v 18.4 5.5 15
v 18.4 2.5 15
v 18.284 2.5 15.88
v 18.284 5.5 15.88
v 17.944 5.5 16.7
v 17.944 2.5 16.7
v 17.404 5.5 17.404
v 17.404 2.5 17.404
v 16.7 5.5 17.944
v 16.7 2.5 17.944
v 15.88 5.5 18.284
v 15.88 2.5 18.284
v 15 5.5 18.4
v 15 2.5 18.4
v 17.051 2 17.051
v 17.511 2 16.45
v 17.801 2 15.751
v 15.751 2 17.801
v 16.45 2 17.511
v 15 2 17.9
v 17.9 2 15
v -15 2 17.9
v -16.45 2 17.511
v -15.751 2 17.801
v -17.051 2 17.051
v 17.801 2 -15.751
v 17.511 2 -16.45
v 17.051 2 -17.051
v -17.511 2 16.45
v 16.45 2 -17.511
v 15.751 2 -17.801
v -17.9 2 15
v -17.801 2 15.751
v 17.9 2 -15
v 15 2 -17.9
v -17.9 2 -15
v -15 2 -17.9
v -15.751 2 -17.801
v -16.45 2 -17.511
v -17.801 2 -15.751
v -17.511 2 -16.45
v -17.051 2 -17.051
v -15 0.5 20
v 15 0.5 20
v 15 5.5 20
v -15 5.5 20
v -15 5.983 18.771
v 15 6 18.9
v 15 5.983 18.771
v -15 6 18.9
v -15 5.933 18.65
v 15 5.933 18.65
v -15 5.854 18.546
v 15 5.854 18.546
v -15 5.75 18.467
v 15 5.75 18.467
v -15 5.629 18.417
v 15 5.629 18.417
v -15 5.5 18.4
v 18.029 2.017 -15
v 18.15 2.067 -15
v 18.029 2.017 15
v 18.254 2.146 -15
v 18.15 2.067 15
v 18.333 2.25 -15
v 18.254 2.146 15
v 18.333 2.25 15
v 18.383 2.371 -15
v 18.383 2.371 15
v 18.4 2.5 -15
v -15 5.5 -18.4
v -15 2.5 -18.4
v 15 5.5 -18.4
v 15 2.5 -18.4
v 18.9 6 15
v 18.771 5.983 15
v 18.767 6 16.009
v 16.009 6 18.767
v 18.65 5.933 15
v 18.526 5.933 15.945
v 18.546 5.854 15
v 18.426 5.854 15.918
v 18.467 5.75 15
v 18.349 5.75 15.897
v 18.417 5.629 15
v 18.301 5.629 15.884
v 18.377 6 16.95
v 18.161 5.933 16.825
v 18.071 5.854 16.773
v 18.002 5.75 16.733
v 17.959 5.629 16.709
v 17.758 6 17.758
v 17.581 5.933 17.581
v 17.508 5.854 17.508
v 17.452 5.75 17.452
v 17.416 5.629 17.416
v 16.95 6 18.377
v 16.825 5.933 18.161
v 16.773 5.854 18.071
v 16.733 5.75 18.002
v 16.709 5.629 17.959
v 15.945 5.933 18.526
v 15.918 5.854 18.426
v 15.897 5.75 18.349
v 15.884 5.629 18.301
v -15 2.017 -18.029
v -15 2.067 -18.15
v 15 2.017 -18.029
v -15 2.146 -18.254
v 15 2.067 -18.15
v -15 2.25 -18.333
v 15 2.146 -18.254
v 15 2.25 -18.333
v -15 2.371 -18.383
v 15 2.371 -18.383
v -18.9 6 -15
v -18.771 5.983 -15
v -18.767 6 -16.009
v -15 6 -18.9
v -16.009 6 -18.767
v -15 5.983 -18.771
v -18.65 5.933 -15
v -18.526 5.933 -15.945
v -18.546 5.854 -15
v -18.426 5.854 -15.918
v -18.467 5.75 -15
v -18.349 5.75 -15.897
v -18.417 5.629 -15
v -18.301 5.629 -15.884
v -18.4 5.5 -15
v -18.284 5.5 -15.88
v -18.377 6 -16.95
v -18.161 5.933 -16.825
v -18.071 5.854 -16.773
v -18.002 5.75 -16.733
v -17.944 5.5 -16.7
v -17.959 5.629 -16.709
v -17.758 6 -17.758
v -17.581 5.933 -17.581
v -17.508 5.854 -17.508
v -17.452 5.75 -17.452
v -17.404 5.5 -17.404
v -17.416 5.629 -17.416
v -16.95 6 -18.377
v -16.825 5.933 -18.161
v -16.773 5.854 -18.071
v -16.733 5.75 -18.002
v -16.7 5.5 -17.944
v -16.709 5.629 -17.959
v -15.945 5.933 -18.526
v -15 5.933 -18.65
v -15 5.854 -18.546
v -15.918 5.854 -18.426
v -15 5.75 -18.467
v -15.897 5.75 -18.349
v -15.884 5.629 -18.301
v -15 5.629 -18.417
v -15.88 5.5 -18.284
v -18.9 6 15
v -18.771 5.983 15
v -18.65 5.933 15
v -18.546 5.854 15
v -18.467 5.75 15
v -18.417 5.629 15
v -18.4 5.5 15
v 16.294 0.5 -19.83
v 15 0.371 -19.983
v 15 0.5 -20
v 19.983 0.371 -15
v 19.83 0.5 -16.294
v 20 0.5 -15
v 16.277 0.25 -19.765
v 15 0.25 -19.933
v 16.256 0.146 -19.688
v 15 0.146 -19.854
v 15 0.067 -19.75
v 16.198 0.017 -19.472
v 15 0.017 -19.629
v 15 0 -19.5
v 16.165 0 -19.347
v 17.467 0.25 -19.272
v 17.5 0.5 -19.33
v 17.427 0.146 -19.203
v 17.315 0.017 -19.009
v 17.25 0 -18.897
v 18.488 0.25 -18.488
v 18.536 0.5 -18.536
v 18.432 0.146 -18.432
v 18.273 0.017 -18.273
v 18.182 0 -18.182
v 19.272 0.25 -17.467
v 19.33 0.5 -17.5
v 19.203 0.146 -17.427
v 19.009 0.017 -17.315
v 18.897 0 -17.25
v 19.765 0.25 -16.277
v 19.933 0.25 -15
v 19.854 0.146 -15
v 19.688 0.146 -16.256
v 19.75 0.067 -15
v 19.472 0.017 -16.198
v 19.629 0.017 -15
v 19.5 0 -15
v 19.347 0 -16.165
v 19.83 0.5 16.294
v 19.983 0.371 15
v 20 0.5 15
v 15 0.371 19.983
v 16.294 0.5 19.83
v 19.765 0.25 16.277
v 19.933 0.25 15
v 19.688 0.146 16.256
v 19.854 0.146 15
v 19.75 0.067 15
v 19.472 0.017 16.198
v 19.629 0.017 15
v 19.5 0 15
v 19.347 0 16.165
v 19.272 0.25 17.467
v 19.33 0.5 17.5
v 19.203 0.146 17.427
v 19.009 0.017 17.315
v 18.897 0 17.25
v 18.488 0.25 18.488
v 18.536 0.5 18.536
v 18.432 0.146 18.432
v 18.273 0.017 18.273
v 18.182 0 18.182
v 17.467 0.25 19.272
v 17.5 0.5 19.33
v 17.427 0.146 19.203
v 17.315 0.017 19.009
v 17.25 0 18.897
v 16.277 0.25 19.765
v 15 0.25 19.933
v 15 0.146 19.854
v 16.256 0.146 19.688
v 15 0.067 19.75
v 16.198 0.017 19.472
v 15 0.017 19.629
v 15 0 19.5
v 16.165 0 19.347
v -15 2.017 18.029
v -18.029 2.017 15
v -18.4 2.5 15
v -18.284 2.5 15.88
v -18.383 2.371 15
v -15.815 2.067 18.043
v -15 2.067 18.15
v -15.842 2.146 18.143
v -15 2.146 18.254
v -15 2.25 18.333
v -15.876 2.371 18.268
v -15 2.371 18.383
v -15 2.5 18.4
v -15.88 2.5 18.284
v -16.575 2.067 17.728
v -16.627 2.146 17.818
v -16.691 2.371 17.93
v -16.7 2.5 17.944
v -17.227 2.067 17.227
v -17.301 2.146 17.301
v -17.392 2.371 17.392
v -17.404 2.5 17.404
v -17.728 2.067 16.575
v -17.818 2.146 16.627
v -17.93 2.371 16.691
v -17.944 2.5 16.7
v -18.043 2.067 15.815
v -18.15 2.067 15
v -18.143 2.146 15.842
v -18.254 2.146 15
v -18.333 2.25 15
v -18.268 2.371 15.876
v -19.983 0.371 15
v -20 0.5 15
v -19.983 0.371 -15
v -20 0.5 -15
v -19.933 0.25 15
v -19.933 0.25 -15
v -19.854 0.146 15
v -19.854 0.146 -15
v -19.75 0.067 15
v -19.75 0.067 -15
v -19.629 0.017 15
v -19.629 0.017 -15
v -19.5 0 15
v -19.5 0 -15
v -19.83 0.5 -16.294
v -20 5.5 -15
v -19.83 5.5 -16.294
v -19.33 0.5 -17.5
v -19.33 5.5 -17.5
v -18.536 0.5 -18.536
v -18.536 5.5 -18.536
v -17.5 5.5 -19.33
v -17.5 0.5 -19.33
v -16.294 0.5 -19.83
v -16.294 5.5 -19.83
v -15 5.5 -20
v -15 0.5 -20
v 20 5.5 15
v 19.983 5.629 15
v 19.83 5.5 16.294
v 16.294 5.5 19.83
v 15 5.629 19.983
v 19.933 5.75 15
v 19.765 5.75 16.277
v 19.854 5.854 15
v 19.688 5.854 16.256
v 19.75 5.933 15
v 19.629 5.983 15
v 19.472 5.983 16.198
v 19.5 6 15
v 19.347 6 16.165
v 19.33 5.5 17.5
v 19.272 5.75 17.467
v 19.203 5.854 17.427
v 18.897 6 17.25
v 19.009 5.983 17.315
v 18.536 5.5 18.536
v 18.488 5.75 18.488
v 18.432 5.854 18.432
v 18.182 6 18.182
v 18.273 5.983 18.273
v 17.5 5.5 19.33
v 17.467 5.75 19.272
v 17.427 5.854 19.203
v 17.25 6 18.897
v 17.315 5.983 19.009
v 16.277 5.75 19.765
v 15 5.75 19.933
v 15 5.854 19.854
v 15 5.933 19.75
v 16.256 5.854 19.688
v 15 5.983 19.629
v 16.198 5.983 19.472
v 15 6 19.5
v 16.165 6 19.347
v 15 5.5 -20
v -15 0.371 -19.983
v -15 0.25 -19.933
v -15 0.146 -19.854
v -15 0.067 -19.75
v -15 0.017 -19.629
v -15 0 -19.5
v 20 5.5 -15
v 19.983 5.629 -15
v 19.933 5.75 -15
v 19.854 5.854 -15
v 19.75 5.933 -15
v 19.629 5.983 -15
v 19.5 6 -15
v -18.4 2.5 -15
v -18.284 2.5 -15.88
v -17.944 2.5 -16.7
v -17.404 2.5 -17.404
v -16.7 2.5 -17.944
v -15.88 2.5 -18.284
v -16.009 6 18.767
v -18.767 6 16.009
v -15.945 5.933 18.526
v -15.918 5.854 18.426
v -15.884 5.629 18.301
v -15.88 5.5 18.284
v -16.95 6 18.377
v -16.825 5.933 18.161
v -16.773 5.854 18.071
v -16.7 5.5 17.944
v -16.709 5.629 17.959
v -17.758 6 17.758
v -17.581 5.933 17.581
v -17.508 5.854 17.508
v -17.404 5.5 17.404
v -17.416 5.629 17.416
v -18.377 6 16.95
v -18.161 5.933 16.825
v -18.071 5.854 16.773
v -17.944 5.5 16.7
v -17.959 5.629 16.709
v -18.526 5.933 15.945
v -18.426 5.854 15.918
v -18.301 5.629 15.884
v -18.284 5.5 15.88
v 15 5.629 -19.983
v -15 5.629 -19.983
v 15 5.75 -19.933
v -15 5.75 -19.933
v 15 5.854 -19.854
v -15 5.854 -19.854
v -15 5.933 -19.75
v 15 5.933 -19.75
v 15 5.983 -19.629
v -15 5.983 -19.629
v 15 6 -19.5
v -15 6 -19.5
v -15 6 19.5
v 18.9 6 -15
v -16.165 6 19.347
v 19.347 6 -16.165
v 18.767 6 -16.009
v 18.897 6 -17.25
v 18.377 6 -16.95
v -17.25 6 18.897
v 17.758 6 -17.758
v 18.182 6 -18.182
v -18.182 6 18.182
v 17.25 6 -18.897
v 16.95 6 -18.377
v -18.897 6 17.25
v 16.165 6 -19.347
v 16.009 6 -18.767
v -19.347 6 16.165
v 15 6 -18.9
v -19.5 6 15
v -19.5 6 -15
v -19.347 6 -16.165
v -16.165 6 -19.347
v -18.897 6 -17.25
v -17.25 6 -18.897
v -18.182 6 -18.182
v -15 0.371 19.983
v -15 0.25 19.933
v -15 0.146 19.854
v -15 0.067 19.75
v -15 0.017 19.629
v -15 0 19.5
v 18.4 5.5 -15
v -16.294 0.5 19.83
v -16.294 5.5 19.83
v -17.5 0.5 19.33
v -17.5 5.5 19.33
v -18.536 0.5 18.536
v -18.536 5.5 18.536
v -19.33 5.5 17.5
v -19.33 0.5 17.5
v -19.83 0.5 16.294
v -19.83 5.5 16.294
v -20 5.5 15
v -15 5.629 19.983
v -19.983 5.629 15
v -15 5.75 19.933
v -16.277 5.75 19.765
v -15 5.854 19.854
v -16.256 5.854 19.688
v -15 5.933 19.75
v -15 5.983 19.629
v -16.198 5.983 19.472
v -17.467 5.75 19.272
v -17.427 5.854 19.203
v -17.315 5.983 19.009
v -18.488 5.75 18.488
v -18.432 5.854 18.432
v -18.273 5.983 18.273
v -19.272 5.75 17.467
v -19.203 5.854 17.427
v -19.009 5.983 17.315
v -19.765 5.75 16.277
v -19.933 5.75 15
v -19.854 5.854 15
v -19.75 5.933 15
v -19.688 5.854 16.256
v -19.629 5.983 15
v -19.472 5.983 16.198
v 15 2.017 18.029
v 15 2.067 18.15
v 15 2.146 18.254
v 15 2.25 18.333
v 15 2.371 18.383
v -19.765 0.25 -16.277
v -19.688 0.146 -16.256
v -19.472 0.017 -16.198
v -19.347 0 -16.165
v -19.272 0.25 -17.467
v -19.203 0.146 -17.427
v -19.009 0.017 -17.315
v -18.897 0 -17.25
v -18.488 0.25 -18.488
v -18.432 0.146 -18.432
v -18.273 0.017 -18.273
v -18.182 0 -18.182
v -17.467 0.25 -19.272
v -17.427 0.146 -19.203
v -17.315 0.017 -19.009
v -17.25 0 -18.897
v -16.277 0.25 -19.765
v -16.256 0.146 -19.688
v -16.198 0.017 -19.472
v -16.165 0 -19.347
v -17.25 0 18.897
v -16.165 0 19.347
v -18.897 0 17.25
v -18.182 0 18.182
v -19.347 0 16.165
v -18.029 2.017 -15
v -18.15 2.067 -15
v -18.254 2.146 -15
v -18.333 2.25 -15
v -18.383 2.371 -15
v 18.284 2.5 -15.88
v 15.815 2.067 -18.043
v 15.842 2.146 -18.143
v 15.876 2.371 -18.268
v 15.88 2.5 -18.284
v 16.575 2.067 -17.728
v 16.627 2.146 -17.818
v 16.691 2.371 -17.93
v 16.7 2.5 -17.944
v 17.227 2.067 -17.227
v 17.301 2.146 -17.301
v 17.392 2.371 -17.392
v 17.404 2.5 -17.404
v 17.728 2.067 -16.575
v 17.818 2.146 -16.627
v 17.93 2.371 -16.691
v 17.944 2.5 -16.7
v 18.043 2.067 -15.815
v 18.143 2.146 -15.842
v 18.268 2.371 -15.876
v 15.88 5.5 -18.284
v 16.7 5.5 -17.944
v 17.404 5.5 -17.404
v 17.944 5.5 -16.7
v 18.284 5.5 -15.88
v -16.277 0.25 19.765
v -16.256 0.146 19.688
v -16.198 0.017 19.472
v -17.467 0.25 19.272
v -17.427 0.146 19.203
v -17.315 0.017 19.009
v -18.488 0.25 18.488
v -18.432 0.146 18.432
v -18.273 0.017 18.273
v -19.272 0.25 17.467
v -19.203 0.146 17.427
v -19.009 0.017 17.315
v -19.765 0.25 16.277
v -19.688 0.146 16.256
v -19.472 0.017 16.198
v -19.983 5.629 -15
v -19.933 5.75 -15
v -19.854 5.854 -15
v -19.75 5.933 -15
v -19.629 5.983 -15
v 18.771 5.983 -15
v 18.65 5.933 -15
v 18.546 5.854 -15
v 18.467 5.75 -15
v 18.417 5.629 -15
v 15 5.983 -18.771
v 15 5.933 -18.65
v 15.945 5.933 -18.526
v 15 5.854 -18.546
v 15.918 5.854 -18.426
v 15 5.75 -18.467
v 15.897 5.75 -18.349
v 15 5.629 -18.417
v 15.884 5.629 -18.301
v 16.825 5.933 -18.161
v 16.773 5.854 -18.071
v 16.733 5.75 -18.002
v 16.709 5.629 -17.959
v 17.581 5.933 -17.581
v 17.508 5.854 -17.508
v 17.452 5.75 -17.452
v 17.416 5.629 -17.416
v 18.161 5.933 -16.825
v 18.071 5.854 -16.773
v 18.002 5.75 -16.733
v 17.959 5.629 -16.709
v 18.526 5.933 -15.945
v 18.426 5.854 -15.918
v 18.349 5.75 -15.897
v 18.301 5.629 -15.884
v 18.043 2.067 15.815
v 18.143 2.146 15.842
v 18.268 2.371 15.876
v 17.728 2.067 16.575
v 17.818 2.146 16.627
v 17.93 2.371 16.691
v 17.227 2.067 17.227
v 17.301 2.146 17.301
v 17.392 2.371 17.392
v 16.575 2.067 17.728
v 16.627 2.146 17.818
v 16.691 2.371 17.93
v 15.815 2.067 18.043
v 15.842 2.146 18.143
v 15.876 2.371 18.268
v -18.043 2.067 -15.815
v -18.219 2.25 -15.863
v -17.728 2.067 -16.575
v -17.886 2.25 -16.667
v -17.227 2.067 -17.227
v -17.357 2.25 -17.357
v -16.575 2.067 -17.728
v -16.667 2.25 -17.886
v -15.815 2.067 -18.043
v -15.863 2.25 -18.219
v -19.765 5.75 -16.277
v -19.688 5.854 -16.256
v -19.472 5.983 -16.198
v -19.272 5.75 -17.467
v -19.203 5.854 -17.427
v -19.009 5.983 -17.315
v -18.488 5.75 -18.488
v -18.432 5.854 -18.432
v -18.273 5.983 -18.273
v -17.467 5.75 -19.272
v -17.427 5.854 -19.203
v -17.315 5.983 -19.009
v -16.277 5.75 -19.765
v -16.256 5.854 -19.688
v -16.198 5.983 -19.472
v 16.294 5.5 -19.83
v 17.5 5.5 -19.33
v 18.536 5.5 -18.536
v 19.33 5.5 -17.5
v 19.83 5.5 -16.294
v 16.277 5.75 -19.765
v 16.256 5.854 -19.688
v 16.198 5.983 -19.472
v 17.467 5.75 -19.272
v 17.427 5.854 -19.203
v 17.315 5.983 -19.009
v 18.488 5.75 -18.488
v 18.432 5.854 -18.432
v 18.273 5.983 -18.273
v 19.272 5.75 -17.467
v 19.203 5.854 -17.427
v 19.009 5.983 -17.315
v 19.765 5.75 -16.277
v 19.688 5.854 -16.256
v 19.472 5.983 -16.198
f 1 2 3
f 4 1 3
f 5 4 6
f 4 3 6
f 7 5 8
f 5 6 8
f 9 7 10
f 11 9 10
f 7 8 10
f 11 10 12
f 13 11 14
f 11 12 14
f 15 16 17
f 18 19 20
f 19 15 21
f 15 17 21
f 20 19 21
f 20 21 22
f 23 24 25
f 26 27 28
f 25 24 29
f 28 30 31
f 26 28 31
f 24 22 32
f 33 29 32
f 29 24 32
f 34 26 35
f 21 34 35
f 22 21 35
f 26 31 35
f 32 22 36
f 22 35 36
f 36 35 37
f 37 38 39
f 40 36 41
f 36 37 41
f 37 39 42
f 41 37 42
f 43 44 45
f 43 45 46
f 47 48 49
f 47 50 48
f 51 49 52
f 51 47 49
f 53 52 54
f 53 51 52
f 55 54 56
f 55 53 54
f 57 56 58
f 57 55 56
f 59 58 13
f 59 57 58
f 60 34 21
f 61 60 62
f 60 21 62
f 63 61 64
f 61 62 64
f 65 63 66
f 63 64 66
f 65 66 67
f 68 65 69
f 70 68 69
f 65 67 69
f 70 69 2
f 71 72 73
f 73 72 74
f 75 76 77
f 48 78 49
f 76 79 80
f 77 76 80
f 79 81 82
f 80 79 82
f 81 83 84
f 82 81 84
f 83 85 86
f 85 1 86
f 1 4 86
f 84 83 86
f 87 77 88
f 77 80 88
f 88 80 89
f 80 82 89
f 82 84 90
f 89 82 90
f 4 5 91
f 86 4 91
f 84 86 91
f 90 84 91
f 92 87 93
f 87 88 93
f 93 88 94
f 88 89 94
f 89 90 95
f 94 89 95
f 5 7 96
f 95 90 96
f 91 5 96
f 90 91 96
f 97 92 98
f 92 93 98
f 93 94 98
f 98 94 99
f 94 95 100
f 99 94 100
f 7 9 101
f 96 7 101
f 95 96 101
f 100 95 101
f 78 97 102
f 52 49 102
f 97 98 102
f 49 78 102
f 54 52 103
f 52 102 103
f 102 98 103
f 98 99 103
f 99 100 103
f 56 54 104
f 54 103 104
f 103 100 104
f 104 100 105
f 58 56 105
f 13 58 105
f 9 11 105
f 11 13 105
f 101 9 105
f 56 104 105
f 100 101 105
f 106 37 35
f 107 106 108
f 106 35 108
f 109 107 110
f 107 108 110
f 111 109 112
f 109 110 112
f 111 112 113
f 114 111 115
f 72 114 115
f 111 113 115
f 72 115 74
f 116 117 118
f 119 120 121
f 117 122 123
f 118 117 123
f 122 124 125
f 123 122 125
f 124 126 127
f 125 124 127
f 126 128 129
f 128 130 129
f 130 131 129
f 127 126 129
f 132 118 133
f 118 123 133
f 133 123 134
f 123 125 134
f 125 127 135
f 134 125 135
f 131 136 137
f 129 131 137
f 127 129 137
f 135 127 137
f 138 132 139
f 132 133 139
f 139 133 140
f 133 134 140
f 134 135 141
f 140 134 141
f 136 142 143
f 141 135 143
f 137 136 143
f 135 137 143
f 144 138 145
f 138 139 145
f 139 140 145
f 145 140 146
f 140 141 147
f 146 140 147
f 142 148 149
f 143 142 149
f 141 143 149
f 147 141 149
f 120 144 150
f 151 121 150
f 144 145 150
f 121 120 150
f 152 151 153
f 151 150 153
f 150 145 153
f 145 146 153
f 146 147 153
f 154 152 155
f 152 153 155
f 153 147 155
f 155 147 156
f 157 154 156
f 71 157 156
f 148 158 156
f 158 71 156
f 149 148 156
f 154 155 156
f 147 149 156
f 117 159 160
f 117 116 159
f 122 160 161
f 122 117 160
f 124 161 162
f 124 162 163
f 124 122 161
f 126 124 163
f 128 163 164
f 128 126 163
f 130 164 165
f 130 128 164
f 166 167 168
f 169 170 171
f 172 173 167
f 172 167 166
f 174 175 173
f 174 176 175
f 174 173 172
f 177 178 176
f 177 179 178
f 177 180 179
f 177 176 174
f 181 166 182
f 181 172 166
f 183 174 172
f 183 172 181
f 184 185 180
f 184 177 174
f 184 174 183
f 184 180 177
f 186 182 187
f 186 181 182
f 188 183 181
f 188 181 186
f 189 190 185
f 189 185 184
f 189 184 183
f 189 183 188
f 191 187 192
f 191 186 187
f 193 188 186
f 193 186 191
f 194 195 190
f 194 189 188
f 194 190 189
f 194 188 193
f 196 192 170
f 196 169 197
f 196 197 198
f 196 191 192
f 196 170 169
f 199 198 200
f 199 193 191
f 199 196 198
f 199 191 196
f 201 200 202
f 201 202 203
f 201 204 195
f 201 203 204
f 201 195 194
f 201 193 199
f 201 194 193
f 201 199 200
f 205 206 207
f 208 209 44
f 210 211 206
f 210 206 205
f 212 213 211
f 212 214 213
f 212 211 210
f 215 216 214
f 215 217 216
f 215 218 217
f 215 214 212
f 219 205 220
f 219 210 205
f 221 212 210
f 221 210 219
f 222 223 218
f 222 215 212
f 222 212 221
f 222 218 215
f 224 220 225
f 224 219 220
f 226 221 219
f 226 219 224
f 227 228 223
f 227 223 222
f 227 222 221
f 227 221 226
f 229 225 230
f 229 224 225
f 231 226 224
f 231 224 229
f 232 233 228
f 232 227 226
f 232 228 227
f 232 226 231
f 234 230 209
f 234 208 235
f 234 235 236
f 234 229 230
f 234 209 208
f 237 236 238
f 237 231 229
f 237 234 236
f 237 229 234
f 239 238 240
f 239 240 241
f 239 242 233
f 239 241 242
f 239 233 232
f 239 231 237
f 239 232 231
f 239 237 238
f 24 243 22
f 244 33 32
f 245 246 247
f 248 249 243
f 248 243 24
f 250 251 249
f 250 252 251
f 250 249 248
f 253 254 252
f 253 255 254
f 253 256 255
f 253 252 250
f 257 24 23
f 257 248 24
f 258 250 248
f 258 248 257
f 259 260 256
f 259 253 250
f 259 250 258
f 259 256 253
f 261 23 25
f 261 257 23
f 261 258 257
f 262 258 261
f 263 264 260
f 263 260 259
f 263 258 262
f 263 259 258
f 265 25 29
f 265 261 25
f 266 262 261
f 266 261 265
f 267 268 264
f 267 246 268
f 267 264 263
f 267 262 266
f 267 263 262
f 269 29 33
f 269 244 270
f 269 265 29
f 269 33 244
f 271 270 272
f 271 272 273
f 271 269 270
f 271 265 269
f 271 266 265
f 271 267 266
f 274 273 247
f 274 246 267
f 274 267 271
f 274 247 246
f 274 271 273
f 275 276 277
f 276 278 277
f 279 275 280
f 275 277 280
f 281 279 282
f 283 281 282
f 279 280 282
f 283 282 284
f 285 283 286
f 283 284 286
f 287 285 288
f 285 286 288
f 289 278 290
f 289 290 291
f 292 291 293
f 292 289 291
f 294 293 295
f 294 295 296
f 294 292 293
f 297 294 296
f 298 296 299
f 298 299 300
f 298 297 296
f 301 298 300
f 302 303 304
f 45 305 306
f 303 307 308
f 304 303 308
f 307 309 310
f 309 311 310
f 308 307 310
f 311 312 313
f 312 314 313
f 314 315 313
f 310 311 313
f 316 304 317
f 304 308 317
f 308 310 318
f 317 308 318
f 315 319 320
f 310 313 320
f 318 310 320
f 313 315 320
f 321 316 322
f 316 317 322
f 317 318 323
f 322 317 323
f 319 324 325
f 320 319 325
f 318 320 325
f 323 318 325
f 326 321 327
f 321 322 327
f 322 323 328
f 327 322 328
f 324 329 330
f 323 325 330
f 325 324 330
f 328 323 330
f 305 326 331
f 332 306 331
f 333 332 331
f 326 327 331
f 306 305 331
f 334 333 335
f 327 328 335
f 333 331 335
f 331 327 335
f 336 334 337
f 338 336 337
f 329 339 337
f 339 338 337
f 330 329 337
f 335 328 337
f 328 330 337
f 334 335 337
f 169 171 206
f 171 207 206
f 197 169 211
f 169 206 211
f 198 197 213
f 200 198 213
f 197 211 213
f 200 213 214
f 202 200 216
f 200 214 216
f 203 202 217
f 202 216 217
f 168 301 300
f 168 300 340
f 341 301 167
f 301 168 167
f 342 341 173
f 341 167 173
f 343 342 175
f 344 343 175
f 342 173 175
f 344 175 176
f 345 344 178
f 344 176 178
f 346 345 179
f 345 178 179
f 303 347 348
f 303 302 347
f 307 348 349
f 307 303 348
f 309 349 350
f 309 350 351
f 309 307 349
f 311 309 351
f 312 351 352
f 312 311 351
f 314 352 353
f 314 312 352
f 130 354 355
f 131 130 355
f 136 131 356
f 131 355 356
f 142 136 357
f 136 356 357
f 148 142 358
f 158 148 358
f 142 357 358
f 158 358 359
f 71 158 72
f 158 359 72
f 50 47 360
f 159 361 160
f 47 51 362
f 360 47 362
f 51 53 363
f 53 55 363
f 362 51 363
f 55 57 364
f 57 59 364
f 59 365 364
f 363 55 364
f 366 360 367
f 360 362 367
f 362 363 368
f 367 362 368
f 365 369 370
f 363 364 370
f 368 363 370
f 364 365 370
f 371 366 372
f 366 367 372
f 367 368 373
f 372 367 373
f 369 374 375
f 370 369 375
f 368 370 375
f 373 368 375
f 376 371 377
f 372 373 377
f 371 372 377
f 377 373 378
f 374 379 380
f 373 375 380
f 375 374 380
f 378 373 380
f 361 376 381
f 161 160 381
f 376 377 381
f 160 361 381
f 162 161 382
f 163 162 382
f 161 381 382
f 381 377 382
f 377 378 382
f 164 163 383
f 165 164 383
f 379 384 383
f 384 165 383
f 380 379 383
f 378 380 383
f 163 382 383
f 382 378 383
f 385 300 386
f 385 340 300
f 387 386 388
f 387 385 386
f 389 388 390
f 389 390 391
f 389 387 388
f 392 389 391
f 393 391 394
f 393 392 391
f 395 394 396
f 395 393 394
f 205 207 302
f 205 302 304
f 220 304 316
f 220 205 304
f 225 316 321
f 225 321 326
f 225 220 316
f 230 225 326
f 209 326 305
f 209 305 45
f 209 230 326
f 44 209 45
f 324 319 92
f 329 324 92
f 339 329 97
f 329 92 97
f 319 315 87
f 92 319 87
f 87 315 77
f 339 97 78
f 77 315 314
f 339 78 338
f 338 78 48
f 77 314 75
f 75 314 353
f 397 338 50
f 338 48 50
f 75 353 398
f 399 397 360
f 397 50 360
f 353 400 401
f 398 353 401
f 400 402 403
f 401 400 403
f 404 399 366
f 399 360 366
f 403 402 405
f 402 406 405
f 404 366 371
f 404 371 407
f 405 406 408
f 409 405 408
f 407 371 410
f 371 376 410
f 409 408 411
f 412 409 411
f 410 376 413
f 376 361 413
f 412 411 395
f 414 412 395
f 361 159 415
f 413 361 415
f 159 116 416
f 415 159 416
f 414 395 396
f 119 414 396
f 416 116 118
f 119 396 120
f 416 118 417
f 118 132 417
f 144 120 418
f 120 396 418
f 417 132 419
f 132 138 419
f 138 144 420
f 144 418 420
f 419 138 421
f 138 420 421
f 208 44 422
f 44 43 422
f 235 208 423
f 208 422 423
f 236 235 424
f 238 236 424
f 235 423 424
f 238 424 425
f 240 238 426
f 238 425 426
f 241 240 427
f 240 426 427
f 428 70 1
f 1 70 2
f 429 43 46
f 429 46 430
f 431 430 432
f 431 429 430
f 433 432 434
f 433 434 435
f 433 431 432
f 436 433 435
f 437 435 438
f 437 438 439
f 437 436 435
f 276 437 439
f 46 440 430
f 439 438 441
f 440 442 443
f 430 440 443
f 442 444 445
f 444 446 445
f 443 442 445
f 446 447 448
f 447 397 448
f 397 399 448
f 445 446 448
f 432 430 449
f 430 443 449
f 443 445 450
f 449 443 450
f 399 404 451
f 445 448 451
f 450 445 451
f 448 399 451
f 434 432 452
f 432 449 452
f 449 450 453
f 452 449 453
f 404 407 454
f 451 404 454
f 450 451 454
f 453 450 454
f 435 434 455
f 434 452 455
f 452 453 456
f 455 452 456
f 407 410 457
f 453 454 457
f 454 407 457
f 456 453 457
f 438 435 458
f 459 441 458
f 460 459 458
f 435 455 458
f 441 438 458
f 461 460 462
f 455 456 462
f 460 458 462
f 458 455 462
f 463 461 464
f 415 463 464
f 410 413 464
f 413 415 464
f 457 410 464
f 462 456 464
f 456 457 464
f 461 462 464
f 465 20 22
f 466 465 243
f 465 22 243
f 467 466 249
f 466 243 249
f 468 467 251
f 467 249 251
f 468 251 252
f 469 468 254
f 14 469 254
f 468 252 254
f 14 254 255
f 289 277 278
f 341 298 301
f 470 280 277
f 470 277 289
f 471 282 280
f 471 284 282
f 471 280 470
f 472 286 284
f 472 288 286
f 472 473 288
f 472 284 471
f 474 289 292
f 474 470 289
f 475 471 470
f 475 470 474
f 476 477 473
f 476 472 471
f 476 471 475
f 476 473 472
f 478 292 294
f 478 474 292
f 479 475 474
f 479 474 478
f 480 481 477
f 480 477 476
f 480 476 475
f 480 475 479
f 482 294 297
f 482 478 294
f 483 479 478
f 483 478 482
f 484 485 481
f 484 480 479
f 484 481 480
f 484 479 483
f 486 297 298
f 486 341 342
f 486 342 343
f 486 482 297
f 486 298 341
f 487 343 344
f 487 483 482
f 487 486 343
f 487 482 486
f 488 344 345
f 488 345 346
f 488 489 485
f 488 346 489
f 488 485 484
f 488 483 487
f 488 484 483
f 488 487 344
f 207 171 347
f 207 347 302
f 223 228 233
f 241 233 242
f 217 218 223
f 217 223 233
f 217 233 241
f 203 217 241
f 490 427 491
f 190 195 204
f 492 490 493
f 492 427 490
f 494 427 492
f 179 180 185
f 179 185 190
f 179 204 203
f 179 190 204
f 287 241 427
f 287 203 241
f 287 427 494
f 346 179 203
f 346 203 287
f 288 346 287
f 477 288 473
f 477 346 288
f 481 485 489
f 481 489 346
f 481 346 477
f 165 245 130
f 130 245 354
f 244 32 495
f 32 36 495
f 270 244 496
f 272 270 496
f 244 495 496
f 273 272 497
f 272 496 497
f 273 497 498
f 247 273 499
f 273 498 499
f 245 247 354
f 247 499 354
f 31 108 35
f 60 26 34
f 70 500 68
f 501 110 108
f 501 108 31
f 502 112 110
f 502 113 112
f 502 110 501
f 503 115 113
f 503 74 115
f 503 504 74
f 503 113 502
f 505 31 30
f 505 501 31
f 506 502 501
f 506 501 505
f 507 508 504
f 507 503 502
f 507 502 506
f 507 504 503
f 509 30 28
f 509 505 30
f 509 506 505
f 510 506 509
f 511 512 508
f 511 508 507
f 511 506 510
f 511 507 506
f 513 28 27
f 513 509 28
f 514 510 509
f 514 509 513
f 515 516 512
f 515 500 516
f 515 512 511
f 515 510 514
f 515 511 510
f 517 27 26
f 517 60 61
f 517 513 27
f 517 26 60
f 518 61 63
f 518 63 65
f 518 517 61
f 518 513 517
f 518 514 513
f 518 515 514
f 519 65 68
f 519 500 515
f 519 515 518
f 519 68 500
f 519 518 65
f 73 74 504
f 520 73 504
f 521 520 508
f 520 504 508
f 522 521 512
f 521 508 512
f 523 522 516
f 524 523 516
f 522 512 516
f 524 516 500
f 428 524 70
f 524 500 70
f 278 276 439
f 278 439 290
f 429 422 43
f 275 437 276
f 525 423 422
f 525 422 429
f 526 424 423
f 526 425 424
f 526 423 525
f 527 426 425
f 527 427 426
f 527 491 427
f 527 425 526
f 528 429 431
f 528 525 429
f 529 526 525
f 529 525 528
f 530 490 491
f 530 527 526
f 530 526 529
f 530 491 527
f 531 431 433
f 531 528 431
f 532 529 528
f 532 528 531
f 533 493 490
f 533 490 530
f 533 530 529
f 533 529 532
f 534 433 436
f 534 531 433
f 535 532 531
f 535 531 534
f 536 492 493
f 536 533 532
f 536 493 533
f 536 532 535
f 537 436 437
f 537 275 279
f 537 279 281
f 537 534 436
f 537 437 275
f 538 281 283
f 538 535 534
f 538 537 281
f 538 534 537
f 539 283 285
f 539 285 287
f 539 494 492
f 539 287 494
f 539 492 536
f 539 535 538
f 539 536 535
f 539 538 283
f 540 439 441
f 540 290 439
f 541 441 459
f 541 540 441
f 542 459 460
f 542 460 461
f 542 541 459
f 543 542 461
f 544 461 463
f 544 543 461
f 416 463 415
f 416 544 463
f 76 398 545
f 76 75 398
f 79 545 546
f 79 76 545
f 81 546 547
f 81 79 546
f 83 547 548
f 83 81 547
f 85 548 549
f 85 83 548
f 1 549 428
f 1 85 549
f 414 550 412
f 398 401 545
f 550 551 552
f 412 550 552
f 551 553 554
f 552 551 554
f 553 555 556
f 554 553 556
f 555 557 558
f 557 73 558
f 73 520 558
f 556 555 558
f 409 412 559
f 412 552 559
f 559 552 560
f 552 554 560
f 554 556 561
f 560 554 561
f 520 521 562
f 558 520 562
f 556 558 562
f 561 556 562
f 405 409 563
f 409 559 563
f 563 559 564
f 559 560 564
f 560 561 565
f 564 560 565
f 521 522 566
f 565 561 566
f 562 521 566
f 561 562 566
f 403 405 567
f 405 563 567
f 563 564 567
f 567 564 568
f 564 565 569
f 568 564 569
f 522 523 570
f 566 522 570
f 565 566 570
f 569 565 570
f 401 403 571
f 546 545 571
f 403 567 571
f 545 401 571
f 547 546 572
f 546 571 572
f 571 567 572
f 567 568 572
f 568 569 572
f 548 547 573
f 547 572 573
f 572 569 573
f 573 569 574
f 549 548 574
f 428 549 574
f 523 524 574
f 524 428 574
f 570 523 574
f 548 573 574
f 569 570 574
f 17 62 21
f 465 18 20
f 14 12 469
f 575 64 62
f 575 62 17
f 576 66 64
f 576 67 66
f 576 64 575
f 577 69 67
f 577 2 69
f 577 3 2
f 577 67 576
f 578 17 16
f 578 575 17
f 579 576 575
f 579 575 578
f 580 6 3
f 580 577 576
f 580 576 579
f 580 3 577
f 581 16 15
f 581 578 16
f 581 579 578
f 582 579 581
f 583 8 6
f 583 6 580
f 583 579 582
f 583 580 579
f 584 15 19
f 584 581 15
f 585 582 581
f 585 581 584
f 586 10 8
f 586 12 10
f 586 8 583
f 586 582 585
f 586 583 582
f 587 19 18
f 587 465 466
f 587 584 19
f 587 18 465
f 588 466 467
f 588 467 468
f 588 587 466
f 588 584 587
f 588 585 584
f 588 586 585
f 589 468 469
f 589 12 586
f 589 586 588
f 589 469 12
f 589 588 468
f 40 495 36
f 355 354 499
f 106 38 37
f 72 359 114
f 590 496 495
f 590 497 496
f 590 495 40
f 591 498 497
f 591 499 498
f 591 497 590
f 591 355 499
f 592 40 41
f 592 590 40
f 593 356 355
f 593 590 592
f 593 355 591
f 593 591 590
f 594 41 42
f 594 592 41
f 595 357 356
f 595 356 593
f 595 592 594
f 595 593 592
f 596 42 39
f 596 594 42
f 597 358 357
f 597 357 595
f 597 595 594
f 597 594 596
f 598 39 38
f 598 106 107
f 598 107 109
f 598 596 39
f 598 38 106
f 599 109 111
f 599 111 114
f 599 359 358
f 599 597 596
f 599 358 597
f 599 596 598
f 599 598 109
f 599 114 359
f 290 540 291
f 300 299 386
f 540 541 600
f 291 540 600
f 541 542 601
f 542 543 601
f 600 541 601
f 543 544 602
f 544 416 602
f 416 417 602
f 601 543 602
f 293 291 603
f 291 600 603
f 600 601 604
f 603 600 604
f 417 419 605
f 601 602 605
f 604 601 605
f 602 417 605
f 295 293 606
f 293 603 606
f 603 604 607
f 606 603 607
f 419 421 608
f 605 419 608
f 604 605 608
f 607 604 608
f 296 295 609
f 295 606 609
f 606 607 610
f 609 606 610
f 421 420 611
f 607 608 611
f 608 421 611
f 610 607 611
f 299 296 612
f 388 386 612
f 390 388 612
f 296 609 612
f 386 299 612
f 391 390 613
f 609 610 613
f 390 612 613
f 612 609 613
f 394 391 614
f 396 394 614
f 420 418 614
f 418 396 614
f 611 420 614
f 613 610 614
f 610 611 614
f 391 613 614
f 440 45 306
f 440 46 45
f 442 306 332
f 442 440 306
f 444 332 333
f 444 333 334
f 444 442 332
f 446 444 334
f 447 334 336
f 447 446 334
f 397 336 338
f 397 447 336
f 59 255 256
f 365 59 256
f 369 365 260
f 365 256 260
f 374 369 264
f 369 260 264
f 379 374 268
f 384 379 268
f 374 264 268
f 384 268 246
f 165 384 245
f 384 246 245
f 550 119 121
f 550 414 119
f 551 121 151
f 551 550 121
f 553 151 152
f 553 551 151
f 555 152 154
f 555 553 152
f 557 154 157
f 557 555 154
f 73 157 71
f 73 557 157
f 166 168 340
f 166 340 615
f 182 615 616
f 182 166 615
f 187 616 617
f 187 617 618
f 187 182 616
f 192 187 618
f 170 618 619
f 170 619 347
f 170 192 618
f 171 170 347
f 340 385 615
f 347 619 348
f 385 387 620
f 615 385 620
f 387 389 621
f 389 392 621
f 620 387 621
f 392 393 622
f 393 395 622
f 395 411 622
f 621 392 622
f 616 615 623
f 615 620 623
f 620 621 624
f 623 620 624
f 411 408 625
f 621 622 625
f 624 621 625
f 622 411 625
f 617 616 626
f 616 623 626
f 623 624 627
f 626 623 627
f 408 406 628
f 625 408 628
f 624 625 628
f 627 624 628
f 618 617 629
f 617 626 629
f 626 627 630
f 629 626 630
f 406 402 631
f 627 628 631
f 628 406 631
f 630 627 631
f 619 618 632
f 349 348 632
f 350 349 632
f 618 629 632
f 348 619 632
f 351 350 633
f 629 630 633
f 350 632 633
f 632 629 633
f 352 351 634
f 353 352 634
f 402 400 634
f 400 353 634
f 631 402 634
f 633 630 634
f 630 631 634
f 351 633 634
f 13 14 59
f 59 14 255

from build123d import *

# Parameters (mm, degrees)
BOSS_EXTRUDE1_DEPTH = 2
EXTRUDE_THIN1_START = 2
EXTRUDE_THIN1_DEPTH = 4
FILLET1_R           = 0.5


with BuildPart() as part:
    # Sketch1 → Boss-Extrude1 (new body)
    with BuildSketch(Plane(origin=(0, 0, 0), x_dir=(1, 0, 0), z_dir=(0, 1, 0))):
        with BuildLine():
            Line((-15, 20), (15, 20))
            ThreePointArc((15, 20), (18.535533906, 18.535533906), (20, 15))
            Line((20, 15), (20, -15))
            ThreePointArc((20, -15), (18.535533906, -18.535533906), (15, -20))
            Line((15, -20), (-15, -20))
            ThreePointArc((-15, -20), (-18.535533906, -18.535533906), (-20, -15))
            Line((-20, -15), (-20, 15))
            ThreePointArc((-20, 15), (-18.535533906, 18.535533906), (-15, 20))
        make_face()
    extrude(amount=BOSS_EXTRUDE1_DEPTH)

    # Sketch1<2> → Extrude-Thin1 (add)
    with BuildSketch(Plane(origin=(0, 0, 0), x_dir=(1, 0, 0), z_dir=(0, 1, 0)).offset(EXTRUDE_THIN1_START)):
        with BuildLine():
            Line((15, -20), (-15, -20))
            ThreePointArc((-15, -20), (-18.535533906, -18.535533906), (-20, -15))
            Line((-20, -15), (-20, 15))
            ThreePointArc((-20, 15), (-18.535533906, 18.535533906), (-15, 20))
            Line((-15, 20), (15, 20))
            ThreePointArc((15, 20), (18.535533906, 18.535533906), (20, 15))
            Line((20, 15), (20, -15))
            ThreePointArc((20, -15), (18.535533906, -18.535533906), (15, -20))
        make_face()
        with BuildLine():
            Line((15, -18.4), (-15, -18.4))
            ThreePointArc((-15, -18.4), (-17.404163056, -17.404163056), (-18.4, -15))
            Line((-18.4, -15), (-18.4, 15))
            ThreePointArc((-18.4, 15), (-17.404163056, 17.404163056), (-15, 18.4))
            Line((-15, 18.4), (15, 18.4))
            ThreePointArc((15, 18.4), (17.404163056, 17.404163056), (18.4, 15))
            Line((18.4, 15), (18.4, -15))
            ThreePointArc((18.4, -15), (17.404163056, -17.404163056), (15, -18.4))
        make_face(mode=Mode.SUBTRACT)
    extrude(amount=EXTRUDE_THIN1_DEPTH)

    # Fillet1
    fillet1_edges = [part.edges().sort_by_distance(p)[0] for p in [
        (0, 0, 20),
        (-18.535533906, 0, 18.535533906),
        (-18.535533906, 6, -18.535533906),
        (-18.535533906, 6, 18.535533906),
        (18.535533906, 6, 18.535533906),
        (18.535533906, 6, -18.535533906),
        (-18.4, 6, 0),
        (0, 6, -18.4),
        (18.4, 6, 0),
        (0, 6, 18.4),
        (-17.404163056, 2, -17.404163056),
        (-17.404163056, 2, 17.404163056),
        (17.404163056, 2, 17.404163056),
        (17.404163056, 2, -17.404163056),
        (-20, 6, 0),
        (0, 6, 20),
        (20, 6, 0),
        (0, 6, -20),
        (-17.404163056, 6, -17.404163056),
        (-18.4, 2, 0),
        (-17.404163056, 6, 17.404163056),
        (0, 2, 18.4),
        (17.404163056, 6, 17.404163056),
        (18.4, 2, 0),
        (17.404163056, 6, -17.404163056),
        (0, 2, -18.4),
        (-20, 0, 0),
        (-18.535533906, 0, -18.535533906),
        (0, 0, -20),
        (18.535533906, 0, -18.535533906),
        (20, 0, 0),
        (18.535533906, 0, 18.535533906),
    ]]
    fillet(fillet1_edges, radius=FILLET1_R)


solid = part.part
